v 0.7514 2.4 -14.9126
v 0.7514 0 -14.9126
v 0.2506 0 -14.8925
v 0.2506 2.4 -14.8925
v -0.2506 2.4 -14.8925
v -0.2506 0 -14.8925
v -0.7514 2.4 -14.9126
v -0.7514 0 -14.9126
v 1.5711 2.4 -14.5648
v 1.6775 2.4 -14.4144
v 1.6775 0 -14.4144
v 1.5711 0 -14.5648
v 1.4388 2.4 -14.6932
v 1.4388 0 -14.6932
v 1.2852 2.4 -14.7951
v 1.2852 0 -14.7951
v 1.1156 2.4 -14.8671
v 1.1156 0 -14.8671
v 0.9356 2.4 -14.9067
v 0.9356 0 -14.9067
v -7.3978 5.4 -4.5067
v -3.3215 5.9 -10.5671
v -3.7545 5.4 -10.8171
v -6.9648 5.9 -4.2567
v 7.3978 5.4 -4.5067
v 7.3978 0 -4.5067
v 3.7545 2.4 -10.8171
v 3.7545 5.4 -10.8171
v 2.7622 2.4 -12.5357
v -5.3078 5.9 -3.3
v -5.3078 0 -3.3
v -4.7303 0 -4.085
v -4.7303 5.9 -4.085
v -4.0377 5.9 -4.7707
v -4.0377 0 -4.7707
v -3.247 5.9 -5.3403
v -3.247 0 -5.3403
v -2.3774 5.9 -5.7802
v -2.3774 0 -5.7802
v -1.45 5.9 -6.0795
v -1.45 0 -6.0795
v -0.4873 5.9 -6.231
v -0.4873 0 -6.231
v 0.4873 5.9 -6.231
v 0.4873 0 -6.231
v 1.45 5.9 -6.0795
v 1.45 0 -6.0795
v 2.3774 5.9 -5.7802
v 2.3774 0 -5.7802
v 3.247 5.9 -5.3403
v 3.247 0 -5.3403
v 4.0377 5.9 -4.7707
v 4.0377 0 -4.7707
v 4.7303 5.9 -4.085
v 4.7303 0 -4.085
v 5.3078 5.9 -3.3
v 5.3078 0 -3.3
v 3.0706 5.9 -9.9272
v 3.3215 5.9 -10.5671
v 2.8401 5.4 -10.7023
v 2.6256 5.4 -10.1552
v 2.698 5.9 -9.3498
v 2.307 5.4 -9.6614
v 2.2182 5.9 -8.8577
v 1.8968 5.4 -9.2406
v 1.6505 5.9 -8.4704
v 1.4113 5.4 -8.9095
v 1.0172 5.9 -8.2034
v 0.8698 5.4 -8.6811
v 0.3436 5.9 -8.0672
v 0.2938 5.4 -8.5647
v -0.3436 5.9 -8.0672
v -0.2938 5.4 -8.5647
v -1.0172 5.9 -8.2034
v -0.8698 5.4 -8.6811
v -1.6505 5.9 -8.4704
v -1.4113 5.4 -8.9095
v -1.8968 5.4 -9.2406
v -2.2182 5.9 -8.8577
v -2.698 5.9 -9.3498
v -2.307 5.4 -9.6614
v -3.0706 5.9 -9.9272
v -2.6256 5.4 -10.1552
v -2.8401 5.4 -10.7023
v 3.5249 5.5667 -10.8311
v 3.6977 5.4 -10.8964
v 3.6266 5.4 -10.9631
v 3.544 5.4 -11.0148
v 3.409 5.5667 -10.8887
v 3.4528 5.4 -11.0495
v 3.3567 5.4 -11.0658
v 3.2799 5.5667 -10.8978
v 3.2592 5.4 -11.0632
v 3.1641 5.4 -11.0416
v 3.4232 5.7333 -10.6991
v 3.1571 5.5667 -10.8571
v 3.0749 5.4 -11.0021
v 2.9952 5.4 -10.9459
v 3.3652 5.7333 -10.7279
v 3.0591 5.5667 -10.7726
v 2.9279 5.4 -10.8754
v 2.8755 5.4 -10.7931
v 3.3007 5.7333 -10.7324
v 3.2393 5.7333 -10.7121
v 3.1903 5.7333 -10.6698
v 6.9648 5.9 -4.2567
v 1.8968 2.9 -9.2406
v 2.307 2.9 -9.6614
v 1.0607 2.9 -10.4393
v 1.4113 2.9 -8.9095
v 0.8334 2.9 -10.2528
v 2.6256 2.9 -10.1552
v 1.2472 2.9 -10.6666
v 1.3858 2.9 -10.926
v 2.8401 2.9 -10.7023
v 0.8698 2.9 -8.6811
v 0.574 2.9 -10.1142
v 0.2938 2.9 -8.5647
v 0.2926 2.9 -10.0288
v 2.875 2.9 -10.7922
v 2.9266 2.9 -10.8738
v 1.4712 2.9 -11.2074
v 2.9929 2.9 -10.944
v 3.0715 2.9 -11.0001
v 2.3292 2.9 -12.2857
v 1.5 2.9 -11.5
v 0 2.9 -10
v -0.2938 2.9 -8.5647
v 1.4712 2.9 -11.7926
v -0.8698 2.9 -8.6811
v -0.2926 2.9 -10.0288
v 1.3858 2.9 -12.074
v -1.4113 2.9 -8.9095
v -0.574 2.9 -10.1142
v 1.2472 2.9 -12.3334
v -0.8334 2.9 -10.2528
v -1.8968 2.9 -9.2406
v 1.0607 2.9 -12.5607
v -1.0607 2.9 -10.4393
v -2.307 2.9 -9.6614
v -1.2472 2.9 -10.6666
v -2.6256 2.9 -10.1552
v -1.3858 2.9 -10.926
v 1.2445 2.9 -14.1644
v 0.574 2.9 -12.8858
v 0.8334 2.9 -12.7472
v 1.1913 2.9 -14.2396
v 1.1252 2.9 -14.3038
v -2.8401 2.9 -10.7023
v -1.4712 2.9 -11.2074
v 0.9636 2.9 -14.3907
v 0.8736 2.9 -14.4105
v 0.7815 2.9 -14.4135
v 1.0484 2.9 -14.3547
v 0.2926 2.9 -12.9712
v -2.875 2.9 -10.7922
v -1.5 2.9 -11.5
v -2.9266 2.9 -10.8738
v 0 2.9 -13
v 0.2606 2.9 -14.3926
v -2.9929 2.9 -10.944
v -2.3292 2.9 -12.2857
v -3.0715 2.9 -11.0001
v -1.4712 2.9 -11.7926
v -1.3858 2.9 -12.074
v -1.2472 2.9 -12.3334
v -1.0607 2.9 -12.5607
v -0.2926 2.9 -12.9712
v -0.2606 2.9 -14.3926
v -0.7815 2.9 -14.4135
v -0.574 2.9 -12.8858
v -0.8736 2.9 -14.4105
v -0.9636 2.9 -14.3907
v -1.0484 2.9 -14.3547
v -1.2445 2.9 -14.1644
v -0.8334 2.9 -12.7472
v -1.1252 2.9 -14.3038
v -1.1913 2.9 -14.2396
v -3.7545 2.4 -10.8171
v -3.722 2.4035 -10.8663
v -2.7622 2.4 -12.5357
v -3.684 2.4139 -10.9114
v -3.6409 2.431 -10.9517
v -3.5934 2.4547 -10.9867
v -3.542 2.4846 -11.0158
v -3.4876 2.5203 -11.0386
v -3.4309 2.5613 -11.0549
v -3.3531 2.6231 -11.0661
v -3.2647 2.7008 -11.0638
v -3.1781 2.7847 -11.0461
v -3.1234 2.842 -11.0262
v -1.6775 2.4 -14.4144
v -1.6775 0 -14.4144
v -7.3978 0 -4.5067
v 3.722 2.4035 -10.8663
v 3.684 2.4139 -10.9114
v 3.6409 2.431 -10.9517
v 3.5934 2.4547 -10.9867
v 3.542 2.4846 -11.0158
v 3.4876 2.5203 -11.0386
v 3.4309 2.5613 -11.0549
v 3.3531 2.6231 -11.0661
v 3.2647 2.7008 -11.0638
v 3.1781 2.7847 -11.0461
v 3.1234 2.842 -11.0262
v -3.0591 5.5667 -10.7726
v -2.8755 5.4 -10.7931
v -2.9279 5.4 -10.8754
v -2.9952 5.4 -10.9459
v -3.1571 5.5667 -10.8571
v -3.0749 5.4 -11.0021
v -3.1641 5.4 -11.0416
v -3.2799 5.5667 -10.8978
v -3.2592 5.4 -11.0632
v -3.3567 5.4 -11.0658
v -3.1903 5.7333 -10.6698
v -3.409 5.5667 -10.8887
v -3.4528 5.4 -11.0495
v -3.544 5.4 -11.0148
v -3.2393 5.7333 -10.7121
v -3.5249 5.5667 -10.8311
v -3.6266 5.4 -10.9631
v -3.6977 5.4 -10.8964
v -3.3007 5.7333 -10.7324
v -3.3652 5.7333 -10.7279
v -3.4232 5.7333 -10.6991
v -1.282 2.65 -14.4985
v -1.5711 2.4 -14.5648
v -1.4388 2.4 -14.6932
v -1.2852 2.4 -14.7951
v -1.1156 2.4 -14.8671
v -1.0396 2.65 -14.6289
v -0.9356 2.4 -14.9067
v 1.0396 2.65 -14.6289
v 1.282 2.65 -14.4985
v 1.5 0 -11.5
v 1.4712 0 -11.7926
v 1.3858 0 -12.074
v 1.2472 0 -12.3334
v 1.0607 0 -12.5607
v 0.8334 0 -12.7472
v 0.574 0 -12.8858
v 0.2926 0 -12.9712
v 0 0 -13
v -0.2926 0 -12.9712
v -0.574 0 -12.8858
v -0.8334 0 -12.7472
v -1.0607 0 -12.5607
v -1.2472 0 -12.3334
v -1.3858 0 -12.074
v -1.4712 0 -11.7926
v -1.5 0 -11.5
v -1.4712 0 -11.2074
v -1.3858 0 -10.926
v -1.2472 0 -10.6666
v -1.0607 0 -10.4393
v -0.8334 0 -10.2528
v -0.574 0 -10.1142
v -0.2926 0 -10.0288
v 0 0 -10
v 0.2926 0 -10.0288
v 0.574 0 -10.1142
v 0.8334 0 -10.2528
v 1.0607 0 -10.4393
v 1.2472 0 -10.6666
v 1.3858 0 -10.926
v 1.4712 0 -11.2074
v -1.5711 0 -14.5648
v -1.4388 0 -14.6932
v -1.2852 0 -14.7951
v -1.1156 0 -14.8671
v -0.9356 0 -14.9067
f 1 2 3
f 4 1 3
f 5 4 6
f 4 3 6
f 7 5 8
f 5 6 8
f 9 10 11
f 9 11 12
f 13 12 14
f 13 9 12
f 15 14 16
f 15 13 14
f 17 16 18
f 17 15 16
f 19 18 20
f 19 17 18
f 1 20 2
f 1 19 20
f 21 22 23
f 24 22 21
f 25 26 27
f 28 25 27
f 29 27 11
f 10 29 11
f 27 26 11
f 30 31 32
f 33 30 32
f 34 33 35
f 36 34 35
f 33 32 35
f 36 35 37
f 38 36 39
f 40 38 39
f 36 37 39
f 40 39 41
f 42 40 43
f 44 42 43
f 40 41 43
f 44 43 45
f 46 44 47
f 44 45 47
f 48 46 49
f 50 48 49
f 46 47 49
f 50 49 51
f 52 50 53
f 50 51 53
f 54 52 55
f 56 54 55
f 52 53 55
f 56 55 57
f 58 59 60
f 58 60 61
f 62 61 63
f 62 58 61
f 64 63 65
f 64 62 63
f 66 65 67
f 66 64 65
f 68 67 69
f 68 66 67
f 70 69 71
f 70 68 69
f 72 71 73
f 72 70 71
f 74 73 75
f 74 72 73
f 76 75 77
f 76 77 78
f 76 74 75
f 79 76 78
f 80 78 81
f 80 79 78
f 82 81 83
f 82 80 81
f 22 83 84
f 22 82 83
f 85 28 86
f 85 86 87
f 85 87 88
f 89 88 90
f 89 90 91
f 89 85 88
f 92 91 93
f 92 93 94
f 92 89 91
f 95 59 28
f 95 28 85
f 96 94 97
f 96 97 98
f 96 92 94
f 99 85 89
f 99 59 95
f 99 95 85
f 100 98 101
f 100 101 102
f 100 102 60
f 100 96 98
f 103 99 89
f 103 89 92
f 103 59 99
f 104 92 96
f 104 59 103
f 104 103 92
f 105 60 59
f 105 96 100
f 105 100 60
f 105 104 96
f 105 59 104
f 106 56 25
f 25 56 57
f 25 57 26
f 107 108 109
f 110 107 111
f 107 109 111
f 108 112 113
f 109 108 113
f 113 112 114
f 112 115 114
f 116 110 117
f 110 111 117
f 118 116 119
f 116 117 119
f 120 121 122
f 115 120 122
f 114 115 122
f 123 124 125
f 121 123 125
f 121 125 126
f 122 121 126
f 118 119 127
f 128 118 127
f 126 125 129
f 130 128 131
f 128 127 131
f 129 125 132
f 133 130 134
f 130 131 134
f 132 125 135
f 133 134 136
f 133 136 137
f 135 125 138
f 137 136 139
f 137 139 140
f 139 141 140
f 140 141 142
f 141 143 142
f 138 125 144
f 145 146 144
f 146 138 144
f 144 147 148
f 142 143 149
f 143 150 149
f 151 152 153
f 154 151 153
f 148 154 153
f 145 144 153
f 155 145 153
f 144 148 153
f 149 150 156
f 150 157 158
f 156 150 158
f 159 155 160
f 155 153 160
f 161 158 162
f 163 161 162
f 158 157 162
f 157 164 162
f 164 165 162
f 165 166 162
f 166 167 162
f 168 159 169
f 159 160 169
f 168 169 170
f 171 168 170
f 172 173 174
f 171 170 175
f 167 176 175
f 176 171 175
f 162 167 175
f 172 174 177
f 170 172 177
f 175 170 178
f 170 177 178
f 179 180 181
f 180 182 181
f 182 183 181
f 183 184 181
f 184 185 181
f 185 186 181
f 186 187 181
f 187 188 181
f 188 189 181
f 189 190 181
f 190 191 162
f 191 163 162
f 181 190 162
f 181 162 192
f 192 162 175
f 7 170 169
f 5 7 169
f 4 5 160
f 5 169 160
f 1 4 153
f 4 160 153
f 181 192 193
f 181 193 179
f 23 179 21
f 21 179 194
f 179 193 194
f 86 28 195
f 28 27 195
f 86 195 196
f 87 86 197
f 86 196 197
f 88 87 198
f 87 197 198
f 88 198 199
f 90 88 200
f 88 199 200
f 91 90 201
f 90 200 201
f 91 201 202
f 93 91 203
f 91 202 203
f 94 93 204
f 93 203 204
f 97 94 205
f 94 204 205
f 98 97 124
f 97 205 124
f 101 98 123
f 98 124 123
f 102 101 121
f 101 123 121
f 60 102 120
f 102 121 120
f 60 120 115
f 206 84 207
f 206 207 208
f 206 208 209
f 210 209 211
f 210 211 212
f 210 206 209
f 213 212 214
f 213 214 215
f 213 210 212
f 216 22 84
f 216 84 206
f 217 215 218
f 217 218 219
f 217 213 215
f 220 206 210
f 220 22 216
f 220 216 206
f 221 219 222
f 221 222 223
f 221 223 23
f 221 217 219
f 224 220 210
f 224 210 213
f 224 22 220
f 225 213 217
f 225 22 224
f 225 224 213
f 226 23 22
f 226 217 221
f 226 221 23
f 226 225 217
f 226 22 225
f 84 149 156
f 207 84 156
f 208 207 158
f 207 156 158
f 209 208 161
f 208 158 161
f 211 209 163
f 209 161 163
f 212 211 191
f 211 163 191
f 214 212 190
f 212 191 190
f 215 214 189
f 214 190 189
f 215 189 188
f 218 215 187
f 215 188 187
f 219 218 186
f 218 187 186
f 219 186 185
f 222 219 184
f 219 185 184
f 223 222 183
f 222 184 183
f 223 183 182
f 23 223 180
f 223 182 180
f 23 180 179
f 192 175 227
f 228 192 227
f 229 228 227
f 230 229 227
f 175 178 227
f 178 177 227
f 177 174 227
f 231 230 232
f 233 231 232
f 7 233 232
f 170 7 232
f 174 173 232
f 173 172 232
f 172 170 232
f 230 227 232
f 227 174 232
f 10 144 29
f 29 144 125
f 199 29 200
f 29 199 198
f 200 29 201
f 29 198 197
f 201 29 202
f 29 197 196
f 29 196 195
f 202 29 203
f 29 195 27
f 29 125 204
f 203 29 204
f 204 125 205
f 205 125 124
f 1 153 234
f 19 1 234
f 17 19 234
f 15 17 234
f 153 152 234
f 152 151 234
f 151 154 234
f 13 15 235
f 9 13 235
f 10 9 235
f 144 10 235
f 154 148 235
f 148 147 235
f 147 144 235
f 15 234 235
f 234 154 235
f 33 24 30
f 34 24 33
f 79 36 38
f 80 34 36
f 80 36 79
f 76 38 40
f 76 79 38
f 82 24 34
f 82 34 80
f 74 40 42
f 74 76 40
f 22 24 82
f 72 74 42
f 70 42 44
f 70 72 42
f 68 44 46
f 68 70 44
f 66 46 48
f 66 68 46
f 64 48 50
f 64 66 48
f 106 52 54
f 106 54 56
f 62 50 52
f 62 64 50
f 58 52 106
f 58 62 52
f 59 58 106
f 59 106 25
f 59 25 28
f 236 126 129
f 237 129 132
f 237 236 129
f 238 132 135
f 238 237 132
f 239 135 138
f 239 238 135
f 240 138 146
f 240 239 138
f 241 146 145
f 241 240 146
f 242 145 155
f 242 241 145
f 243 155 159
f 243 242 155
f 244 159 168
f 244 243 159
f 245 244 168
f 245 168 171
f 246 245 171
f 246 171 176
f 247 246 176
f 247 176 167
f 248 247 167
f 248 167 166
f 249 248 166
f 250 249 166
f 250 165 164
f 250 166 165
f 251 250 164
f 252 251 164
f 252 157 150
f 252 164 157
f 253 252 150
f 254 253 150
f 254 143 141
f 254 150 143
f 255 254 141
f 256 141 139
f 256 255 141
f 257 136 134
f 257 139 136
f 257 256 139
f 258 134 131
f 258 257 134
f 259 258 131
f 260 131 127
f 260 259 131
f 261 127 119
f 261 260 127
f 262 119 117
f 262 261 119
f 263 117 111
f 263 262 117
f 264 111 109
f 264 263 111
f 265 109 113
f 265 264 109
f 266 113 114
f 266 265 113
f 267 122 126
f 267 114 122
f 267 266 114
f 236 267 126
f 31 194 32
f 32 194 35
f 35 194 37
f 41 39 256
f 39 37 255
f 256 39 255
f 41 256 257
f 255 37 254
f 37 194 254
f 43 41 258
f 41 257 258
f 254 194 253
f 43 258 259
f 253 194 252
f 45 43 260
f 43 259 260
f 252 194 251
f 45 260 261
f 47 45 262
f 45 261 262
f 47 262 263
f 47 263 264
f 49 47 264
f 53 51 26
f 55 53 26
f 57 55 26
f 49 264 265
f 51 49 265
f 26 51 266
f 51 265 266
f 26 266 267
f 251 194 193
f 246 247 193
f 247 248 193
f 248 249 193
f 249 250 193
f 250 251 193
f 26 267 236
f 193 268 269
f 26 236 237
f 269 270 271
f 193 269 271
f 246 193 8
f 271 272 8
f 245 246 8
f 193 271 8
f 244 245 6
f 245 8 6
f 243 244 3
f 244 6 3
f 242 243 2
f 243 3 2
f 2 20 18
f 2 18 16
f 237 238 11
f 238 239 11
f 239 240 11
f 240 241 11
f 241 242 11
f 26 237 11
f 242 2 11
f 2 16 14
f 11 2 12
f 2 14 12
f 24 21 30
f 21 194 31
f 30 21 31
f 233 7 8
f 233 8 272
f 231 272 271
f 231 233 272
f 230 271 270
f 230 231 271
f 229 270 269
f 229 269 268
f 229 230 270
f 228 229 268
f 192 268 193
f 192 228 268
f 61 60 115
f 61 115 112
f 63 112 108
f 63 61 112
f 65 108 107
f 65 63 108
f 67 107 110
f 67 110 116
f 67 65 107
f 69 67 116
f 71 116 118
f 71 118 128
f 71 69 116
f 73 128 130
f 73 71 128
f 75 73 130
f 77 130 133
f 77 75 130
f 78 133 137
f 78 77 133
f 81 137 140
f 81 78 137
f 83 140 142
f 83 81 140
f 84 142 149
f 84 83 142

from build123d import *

# Parameters (mm, degrees)
SKETCH1_R                = 1.5
BASE_DEPTH               = 5.9
FASTENER_CLEARANCE_DEPTH = 3
FASTENER_FILLET_R        = 0.5
BASE_FILLET_R            = 1
BODY_CHAMFER_SIZE        = 0.5


with BuildPart() as part:
    # Sketch1 → Base (new body)
    with BuildSketch(Plane(origin=(0, 0, 0), x_dir=(1, 0, 0), z_dir=(0, 1, 0))):
        with BuildLine():
            Line((5.307777313, 3.3), (7.397782409, 4.506665005))
            Line((7.397782409, 4.506665005), (1.360112218, 14.964216534))
            ThreePointArc((1.360112218, 14.964216534), (0, 14.89), (-1.360112218, 14.964216534))
            Line((-1.360112218, 14.964216534), (-7.397782409, 4.506665005))
            Line((-7.397782409, 4.506665005), (-5.307777313, 3.3))
            ThreePointArc((-5.307777313, 3.3), (0, 6.25), (5.307777313, 3.3))
        make_face()
        with Locations((0, 11.5)):
            Circle(SKETCH1_R, mode=Mode.SUBTRACT)
    extrude(amount=BASE_DEPTH)

    # Sketch2 → Fastener Clearance (cut)
    with BuildSketch(Plane(origin=(0, 5.9, 0), x_dir=(1, 0, 0), z_dir=(0, 1, 0))):
        with BuildLine():
            Line((-2.762208294, 12.535714894), (-1.360112218, 14.964216534))
            ThreePointArc((-1.360112218, 14.964216534), (0, 14.89), (1.360112218, 14.964216534))
            Line((1.360112218, 14.964216534), (2.762208294, 12.535714894))
            ThreePointArc((2.762208294, 12.535714894), (0, 8.55), (-2.762208294, 12.535714894))
        make_face()
    extrude(amount=-FASTENER_CLEARANCE_DEPTH, mode=Mode.SUBTRACT)

    # Fastener Fillet
    fastener_fillet_edges = [part.edges().sort_by_distance(p)[0] for p in [
        (2.762208294, 4.4, -12.535714894),
        (-2.762208294, 4.4, -12.535714894),
    ]]
    fillet(fastener_fillet_edges, radius=FASTENER_FILLET_R)

    # Base Fillet
    base_fillet_edges = [part.edges().sort_by_distance(p)[0] for p in [
        (-1.360112218, 1.45, -14.964216534),
        (1.360112218, 1.45, -14.964216534),
    ]]
    fillet(base_fillet_edges, radius=BASE_FILLET_R)

    # Body Chamfer
    body_chamfer_edges = [part.edges().sort_by_distance(p)[0] for p in [
        (5.576129132, 5.9, -7.661861034),
        (2.219874831, 2.9, -13.475064006),
        (0, 5.9, -8.55),
        (-5.576129132, 5.9, -7.661861034),
        (-3.259182505, 5.9, -11.063163021),
        (3.259182505, 5.9, -11.063163021),
        (-2.219874831, 2.9, -13.475064006),
        (0, 2.9, -14.89),
        (1.285248704, 2.9, -14.795081779),
        (-1.285248704, 2.9, -14.795081779),
    ]]
    chamfer(body_chamfer_edges, length=BODY_CHAMFER_SIZE)


solid = part.part
